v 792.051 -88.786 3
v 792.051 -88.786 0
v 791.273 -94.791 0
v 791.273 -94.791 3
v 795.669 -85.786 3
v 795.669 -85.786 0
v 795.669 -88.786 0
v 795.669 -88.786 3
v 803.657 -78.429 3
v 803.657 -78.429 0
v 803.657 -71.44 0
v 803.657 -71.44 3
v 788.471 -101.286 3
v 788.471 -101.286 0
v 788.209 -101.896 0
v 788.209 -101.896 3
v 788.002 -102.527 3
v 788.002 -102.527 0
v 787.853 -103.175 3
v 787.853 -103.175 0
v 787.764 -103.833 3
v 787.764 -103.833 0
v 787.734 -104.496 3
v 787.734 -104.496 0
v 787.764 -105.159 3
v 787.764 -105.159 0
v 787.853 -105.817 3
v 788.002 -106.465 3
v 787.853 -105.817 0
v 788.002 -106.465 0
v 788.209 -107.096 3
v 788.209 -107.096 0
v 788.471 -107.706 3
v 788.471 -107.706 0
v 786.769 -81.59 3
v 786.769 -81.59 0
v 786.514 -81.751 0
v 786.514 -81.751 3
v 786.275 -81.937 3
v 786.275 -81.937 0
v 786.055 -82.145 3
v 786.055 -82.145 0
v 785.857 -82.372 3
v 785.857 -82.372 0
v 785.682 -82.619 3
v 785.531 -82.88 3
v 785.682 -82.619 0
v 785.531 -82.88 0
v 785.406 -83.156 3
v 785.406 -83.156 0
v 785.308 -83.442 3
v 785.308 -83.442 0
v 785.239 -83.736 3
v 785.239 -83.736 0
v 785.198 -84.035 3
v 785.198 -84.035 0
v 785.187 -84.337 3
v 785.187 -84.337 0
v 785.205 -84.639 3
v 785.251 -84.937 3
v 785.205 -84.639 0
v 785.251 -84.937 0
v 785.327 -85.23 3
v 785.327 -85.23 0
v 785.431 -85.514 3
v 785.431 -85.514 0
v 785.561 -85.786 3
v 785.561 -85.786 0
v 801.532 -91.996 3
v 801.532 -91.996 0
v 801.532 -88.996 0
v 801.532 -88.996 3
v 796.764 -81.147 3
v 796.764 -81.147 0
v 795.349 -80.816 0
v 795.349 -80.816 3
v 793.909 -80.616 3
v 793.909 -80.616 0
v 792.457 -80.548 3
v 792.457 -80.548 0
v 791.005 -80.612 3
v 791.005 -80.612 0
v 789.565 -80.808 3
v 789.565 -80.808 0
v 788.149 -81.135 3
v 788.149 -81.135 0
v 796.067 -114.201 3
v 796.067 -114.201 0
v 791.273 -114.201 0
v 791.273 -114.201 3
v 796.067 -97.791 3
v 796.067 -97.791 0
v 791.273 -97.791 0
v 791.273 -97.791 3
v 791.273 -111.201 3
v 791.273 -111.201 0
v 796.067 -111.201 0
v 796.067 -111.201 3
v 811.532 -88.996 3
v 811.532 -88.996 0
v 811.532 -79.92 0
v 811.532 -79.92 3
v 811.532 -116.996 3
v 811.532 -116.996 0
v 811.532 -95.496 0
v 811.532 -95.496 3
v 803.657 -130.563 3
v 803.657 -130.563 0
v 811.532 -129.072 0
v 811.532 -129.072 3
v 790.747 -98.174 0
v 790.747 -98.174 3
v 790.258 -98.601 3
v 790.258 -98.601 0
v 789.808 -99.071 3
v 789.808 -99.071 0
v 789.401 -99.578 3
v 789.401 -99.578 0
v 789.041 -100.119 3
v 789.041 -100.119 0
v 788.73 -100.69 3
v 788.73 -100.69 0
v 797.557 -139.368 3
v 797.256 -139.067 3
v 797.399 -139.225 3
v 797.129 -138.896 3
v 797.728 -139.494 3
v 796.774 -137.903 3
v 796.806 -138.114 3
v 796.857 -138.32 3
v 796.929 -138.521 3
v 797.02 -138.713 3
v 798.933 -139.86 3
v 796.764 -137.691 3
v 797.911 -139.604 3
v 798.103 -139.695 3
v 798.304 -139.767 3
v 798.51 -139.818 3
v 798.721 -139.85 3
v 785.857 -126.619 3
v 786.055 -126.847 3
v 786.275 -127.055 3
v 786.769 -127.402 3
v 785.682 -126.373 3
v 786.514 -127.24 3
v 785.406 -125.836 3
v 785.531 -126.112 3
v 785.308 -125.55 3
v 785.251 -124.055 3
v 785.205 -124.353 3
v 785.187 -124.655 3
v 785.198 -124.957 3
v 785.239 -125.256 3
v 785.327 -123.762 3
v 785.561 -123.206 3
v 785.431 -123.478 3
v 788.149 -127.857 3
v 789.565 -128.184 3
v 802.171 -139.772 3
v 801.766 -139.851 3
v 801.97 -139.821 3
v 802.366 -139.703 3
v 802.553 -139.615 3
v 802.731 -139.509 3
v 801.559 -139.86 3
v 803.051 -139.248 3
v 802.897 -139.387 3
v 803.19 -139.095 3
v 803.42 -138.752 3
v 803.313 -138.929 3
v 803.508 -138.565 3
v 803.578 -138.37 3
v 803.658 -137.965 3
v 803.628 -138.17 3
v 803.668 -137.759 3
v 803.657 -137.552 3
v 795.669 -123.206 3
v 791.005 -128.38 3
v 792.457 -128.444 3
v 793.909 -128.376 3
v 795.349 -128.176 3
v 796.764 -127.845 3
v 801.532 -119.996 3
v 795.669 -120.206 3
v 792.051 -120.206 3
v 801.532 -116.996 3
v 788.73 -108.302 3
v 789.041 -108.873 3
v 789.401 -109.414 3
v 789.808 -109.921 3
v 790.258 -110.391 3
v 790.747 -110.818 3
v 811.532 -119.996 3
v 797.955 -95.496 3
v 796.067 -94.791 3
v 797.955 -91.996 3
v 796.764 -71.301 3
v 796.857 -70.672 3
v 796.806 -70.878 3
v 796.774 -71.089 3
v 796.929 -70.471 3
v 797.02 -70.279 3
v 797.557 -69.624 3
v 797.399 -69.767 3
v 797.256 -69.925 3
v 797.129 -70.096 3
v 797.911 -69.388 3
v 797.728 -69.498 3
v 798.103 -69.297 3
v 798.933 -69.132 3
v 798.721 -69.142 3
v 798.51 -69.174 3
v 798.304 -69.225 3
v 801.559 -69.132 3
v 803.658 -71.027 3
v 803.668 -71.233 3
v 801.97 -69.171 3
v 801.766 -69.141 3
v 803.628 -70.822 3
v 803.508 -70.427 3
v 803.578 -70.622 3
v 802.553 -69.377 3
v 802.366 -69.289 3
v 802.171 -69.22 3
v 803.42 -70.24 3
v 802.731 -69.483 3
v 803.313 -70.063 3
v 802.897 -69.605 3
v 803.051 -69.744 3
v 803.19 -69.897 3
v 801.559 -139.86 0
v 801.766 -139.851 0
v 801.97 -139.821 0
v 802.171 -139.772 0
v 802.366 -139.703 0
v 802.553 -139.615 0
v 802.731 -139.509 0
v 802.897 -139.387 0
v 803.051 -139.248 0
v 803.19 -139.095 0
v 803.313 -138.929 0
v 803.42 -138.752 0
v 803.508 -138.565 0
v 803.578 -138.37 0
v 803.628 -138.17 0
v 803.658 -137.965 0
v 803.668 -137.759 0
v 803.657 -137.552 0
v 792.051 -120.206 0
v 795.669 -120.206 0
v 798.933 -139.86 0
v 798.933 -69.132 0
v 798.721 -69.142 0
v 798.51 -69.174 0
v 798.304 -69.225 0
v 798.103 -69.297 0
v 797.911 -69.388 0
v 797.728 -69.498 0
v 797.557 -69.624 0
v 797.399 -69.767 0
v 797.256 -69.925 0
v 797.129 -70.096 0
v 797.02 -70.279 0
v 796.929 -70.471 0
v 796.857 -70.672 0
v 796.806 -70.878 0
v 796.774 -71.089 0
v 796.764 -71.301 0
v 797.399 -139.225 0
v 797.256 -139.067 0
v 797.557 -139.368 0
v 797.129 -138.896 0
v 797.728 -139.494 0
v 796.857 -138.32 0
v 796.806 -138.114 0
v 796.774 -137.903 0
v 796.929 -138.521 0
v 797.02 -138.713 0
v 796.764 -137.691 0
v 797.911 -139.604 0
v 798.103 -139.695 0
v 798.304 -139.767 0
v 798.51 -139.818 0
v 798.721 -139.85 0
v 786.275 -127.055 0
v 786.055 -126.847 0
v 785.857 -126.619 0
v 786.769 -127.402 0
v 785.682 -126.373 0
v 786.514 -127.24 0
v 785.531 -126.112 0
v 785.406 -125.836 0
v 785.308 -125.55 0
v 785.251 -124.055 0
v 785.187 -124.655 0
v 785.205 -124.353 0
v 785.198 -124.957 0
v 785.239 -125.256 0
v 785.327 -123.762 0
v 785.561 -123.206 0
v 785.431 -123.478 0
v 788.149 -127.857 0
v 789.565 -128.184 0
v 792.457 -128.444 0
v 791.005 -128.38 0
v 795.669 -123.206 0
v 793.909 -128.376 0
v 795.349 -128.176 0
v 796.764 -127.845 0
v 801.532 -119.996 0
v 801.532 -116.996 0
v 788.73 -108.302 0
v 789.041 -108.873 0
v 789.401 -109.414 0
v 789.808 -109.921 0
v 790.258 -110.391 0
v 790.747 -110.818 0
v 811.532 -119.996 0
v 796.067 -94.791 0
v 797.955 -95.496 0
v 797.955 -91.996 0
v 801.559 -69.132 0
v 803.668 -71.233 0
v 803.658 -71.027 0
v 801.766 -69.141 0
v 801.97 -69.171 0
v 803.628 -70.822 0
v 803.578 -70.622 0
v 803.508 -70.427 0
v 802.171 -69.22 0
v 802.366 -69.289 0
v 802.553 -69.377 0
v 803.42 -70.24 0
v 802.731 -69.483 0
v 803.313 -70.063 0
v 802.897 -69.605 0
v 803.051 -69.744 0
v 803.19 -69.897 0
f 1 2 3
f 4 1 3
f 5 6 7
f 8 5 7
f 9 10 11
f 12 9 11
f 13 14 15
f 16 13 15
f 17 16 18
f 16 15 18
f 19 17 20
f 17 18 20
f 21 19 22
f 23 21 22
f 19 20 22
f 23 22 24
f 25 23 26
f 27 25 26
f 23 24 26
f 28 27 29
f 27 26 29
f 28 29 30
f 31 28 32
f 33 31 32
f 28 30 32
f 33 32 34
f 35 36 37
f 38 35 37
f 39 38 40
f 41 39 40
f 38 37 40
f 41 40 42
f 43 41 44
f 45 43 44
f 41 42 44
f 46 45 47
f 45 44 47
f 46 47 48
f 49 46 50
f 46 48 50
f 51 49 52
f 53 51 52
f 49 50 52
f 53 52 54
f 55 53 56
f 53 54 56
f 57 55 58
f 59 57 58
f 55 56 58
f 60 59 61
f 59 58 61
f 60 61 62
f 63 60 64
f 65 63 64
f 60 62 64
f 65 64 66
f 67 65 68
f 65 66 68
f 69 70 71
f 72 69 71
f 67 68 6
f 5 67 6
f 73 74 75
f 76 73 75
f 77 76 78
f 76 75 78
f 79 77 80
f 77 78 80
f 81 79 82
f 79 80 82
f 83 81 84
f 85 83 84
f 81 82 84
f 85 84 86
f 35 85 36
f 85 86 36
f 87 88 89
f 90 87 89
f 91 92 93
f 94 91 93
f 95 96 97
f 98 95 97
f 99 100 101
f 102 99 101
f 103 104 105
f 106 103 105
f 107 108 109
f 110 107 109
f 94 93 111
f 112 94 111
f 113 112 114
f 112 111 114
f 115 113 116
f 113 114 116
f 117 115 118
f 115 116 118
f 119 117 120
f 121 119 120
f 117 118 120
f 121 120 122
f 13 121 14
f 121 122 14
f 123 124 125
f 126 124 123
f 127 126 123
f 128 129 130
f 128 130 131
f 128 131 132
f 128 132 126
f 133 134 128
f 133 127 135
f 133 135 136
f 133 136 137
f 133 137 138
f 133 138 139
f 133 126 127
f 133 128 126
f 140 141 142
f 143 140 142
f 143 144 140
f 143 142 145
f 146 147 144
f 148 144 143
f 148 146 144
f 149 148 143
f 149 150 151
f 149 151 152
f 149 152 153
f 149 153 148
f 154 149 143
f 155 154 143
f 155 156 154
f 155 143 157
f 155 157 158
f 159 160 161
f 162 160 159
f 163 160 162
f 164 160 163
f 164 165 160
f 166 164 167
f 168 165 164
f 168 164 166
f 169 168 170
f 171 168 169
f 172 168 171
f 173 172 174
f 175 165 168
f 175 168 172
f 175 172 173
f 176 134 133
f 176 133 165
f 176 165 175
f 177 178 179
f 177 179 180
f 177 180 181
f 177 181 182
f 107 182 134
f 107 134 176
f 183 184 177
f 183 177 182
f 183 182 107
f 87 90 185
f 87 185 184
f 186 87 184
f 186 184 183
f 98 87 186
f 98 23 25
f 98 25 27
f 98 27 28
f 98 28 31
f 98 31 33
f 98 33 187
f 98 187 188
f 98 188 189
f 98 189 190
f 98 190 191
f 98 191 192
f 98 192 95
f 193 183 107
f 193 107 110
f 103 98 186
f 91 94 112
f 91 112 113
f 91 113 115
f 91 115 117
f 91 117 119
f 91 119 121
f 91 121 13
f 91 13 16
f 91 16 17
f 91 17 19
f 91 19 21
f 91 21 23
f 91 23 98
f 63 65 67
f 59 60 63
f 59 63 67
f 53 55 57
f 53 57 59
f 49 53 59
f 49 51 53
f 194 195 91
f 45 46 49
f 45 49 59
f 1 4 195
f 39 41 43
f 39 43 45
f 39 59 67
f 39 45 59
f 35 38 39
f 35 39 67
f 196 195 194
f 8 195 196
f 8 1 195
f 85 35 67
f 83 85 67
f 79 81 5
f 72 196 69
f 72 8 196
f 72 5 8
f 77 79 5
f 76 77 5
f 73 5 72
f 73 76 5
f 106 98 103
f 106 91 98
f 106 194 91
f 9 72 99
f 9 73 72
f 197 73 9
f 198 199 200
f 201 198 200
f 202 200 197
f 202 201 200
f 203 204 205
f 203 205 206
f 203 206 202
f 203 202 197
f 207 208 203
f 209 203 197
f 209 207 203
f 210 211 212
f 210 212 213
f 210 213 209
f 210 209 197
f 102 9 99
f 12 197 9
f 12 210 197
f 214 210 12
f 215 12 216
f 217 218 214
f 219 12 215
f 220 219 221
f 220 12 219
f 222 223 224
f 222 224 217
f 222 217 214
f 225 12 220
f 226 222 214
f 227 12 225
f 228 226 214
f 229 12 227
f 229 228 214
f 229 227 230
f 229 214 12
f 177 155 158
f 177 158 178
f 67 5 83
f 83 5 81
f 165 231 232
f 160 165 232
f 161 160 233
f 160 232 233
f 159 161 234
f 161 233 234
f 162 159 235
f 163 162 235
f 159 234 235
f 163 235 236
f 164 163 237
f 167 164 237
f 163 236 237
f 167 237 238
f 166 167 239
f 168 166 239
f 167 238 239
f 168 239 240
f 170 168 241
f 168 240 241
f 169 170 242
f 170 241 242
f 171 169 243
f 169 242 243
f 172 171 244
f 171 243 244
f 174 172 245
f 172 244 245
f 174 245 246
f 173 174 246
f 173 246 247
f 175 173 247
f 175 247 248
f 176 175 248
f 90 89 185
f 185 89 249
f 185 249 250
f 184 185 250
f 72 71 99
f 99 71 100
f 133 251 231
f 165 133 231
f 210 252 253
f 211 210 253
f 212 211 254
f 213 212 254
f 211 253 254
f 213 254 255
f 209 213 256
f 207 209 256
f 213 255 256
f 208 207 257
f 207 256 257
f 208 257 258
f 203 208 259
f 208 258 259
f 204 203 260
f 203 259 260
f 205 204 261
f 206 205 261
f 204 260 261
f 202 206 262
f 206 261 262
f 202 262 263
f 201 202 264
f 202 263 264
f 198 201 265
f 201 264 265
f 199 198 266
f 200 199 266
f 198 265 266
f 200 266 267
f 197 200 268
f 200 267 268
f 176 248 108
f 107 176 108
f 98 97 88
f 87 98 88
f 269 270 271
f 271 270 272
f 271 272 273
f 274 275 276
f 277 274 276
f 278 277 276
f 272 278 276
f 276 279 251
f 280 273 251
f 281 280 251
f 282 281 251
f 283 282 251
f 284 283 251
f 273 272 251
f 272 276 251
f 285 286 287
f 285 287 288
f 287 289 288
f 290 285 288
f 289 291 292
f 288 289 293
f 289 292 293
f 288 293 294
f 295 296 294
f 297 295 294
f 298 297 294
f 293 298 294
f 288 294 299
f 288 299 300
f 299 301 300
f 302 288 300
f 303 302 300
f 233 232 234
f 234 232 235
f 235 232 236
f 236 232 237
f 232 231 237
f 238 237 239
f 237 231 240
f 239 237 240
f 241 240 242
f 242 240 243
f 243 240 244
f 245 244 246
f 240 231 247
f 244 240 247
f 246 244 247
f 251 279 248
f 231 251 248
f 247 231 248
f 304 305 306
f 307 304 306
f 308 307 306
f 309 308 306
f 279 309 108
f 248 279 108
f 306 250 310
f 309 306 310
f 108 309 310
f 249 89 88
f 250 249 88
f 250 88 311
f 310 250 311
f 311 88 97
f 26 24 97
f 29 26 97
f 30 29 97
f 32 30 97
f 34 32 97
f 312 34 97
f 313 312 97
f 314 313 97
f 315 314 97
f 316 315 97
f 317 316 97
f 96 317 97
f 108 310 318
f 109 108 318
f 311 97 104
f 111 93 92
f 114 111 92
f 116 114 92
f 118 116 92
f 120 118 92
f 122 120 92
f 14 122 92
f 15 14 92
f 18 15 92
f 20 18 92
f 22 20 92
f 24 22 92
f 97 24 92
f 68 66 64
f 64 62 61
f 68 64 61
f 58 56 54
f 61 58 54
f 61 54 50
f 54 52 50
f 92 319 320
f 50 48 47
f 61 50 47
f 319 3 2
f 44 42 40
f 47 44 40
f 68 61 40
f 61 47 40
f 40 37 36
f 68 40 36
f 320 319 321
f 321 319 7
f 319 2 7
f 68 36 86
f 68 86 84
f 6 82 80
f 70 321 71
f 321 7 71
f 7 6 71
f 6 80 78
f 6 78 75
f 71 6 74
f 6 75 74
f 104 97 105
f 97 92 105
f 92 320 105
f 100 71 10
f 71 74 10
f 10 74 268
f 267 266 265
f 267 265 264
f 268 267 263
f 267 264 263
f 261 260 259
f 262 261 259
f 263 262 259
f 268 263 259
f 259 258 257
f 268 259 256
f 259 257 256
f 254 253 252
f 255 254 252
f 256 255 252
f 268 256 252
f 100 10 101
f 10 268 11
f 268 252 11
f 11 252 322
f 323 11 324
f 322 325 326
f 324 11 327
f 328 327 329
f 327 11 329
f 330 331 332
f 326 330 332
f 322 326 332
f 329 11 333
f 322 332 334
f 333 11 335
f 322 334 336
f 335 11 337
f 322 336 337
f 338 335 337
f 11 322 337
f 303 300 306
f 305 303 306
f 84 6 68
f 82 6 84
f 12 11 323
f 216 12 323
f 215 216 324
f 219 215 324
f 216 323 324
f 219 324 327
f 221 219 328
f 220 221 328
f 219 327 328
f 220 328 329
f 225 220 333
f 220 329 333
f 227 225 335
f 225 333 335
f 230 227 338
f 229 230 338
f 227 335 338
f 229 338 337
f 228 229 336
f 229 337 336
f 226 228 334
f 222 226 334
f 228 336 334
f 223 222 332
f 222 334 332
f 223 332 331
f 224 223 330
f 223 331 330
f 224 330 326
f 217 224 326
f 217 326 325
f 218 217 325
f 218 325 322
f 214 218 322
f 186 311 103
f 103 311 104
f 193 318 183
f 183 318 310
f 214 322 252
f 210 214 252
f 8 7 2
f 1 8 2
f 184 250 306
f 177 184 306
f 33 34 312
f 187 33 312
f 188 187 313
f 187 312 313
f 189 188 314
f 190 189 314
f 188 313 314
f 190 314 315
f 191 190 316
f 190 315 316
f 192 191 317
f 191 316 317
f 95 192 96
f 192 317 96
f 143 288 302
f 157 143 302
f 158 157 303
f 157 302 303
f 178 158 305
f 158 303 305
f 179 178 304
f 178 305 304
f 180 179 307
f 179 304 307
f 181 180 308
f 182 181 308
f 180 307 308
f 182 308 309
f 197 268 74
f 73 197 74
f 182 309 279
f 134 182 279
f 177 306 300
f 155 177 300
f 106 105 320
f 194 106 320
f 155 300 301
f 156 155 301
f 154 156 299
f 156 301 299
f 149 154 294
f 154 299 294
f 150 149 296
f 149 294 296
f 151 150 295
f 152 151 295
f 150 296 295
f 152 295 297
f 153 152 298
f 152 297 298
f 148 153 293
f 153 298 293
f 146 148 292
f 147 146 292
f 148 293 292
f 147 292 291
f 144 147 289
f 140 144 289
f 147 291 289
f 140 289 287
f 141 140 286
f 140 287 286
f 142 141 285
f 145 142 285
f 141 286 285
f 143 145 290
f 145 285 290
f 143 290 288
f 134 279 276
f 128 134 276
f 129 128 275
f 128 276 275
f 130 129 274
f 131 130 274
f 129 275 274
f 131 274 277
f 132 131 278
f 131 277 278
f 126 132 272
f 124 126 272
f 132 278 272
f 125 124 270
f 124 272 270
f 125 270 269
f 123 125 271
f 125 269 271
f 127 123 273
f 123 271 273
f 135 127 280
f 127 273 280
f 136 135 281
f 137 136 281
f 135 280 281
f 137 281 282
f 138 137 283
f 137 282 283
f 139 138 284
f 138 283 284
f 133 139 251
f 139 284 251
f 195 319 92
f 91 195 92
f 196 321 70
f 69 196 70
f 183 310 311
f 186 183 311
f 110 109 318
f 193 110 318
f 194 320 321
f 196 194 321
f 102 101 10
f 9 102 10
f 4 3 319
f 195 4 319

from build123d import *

# Parameters (mm, degrees)
BASE_EXTRUDE_DEPTH = 3


with BuildPart() as part:
    # Sketch1 → Base-Extrude (new body)
    with BuildSketch(Plane.XY):
        with BuildLine():
            Line((796.067430824, -94.790628806), (796.067430824, -97.790628806))
            Line((796.067430824, -97.790628806), (791.272591236, -97.790628806))
            ThreePointArc((791.272591236, -97.790628806), (789.599137263, -99.319974572), (788.471131564, -101.286430728))
            ThreePointArc((788.471131564, -101.286430728), (787.733624184, -104.495988694), (788.471131564, -107.705546661))
            ThreePointArc((788.471131564, -107.705546661), (789.599137263, -109.672002816), (791.272591236, -111.201348582))
            Line((791.272591236, -111.201348582), (796.067430824, -111.201348582))
            Line((796.067430824, -111.201348582), (796.067430824, -114.201348582))
            Line((796.067430824, -114.201348582), (791.272591236, -114.201348582))
            Line((791.272591236, -114.201348582), (792.051319906, -120.205546661))
            Line((792.051319906, -120.205546661), (795.668694327, -120.205546661))
            Line((795.668694327, -120.205546661), (795.668694327, -123.205546661))
            Line((795.668694327, -123.205546661), (785.561028396, -123.205546661))
            ThreePointArc((785.561028396, -123.205546661), (785.308371949, -125.550343576), (786.768988057, -127.401966768))
            ThreePointArc((786.768988057, -127.401966768), (791.730710774, -128.428848688), (796.763839141, -127.845069923))
            Line((796.763839141, -127.845069923), (796.763839141, -137.690530558))
            ThreePointArc((796.763839141, -137.690530558), (797.399275262, -139.224609057), (798.933353761, -139.860045178))
            Line((798.933353761, -139.860045178), (801.559237467, -139.860045178))
            ThreePointArc((801.559237467, -139.860045178), (803.122225358, -139.173347979), (803.657482492, -137.552242187))
            Line((803.657482492, -137.552242187), (803.657482492, -130.563057952))
            Line((803.657482492, -130.563057952), (811.531636536, -129.07193908))
            Line((811.531636536, -129.07193908), (811.531636536, -119.995988694))
            Line((811.531636536, -119.995988694), (801.531636536, -119.995988694))
            Line((801.531636536, -119.995988694), (801.531636536, -116.995988694))
            Line((801.531636536, -116.995988694), (811.531636536, -116.995988694))
            Line((811.531636536, -116.995988694), (811.531636536, -95.495988694))
            Line((811.531636536, -95.495988694), (797.954990923, -95.495988694))
            Line((797.954990923, -95.495988694), (797.954990923, -94.995988694))
            Line((797.954990923, -94.995988694), (797.954990923, -91.995988694))
            Line((797.954990923, -91.995988694), (801.531636536, -91.995988694))
            Line((801.531636536, -91.995988694), (801.531636536, -88.995988694))
            Line((801.531636536, -88.995988694), (811.531636536, -88.995988694))
            Line((811.531636536, -88.995988694), (811.531636536, -79.920038308))
            Line((811.531636536, -79.920038308), (803.657482492, -78.428919436))
            Line((803.657482492, -78.428919436), (803.657482492, -71.439735201))
            ThreePointArc((803.657482492, -71.439735201), (803.122225358, -69.818629409), (801.559237467, -69.131932211))
            Line((801.559237467, -69.131932211), (798.933353761, -69.131932211))
            ThreePointArc((798.933353761, -69.131932211), (797.399275262, -69.767368331), (796.763839141, -71.30144683))
            Line((796.763839141, -71.30144683), (796.763839141, -81.146907465))
            ThreePointArc((796.763839141, -81.146907465), (791.730710774, -80.5631287), (786.768988057, -81.590010621))
            ThreePointArc((786.768988057, -81.590010621), (785.308371949, -83.441633812), (785.561028396, -85.786430728))
            Line((785.561028396, -85.786430728), (795.668694327, -85.786430728))
            Line((795.668694327, -85.786430728), (795.668694327, -88.786430728))
            Line((795.668694327, -88.786430728), (792.051319906, -88.786430728))
            Line((792.051319906, -88.786430728), (791.272591236, -94.790628806))
            Line((791.272591236, -94.790628806), (796.067430824, -94.790628806))
        make_face()
    extrude(amount=BASE_EXTRUDE_DEPTH)


solid = part.part
